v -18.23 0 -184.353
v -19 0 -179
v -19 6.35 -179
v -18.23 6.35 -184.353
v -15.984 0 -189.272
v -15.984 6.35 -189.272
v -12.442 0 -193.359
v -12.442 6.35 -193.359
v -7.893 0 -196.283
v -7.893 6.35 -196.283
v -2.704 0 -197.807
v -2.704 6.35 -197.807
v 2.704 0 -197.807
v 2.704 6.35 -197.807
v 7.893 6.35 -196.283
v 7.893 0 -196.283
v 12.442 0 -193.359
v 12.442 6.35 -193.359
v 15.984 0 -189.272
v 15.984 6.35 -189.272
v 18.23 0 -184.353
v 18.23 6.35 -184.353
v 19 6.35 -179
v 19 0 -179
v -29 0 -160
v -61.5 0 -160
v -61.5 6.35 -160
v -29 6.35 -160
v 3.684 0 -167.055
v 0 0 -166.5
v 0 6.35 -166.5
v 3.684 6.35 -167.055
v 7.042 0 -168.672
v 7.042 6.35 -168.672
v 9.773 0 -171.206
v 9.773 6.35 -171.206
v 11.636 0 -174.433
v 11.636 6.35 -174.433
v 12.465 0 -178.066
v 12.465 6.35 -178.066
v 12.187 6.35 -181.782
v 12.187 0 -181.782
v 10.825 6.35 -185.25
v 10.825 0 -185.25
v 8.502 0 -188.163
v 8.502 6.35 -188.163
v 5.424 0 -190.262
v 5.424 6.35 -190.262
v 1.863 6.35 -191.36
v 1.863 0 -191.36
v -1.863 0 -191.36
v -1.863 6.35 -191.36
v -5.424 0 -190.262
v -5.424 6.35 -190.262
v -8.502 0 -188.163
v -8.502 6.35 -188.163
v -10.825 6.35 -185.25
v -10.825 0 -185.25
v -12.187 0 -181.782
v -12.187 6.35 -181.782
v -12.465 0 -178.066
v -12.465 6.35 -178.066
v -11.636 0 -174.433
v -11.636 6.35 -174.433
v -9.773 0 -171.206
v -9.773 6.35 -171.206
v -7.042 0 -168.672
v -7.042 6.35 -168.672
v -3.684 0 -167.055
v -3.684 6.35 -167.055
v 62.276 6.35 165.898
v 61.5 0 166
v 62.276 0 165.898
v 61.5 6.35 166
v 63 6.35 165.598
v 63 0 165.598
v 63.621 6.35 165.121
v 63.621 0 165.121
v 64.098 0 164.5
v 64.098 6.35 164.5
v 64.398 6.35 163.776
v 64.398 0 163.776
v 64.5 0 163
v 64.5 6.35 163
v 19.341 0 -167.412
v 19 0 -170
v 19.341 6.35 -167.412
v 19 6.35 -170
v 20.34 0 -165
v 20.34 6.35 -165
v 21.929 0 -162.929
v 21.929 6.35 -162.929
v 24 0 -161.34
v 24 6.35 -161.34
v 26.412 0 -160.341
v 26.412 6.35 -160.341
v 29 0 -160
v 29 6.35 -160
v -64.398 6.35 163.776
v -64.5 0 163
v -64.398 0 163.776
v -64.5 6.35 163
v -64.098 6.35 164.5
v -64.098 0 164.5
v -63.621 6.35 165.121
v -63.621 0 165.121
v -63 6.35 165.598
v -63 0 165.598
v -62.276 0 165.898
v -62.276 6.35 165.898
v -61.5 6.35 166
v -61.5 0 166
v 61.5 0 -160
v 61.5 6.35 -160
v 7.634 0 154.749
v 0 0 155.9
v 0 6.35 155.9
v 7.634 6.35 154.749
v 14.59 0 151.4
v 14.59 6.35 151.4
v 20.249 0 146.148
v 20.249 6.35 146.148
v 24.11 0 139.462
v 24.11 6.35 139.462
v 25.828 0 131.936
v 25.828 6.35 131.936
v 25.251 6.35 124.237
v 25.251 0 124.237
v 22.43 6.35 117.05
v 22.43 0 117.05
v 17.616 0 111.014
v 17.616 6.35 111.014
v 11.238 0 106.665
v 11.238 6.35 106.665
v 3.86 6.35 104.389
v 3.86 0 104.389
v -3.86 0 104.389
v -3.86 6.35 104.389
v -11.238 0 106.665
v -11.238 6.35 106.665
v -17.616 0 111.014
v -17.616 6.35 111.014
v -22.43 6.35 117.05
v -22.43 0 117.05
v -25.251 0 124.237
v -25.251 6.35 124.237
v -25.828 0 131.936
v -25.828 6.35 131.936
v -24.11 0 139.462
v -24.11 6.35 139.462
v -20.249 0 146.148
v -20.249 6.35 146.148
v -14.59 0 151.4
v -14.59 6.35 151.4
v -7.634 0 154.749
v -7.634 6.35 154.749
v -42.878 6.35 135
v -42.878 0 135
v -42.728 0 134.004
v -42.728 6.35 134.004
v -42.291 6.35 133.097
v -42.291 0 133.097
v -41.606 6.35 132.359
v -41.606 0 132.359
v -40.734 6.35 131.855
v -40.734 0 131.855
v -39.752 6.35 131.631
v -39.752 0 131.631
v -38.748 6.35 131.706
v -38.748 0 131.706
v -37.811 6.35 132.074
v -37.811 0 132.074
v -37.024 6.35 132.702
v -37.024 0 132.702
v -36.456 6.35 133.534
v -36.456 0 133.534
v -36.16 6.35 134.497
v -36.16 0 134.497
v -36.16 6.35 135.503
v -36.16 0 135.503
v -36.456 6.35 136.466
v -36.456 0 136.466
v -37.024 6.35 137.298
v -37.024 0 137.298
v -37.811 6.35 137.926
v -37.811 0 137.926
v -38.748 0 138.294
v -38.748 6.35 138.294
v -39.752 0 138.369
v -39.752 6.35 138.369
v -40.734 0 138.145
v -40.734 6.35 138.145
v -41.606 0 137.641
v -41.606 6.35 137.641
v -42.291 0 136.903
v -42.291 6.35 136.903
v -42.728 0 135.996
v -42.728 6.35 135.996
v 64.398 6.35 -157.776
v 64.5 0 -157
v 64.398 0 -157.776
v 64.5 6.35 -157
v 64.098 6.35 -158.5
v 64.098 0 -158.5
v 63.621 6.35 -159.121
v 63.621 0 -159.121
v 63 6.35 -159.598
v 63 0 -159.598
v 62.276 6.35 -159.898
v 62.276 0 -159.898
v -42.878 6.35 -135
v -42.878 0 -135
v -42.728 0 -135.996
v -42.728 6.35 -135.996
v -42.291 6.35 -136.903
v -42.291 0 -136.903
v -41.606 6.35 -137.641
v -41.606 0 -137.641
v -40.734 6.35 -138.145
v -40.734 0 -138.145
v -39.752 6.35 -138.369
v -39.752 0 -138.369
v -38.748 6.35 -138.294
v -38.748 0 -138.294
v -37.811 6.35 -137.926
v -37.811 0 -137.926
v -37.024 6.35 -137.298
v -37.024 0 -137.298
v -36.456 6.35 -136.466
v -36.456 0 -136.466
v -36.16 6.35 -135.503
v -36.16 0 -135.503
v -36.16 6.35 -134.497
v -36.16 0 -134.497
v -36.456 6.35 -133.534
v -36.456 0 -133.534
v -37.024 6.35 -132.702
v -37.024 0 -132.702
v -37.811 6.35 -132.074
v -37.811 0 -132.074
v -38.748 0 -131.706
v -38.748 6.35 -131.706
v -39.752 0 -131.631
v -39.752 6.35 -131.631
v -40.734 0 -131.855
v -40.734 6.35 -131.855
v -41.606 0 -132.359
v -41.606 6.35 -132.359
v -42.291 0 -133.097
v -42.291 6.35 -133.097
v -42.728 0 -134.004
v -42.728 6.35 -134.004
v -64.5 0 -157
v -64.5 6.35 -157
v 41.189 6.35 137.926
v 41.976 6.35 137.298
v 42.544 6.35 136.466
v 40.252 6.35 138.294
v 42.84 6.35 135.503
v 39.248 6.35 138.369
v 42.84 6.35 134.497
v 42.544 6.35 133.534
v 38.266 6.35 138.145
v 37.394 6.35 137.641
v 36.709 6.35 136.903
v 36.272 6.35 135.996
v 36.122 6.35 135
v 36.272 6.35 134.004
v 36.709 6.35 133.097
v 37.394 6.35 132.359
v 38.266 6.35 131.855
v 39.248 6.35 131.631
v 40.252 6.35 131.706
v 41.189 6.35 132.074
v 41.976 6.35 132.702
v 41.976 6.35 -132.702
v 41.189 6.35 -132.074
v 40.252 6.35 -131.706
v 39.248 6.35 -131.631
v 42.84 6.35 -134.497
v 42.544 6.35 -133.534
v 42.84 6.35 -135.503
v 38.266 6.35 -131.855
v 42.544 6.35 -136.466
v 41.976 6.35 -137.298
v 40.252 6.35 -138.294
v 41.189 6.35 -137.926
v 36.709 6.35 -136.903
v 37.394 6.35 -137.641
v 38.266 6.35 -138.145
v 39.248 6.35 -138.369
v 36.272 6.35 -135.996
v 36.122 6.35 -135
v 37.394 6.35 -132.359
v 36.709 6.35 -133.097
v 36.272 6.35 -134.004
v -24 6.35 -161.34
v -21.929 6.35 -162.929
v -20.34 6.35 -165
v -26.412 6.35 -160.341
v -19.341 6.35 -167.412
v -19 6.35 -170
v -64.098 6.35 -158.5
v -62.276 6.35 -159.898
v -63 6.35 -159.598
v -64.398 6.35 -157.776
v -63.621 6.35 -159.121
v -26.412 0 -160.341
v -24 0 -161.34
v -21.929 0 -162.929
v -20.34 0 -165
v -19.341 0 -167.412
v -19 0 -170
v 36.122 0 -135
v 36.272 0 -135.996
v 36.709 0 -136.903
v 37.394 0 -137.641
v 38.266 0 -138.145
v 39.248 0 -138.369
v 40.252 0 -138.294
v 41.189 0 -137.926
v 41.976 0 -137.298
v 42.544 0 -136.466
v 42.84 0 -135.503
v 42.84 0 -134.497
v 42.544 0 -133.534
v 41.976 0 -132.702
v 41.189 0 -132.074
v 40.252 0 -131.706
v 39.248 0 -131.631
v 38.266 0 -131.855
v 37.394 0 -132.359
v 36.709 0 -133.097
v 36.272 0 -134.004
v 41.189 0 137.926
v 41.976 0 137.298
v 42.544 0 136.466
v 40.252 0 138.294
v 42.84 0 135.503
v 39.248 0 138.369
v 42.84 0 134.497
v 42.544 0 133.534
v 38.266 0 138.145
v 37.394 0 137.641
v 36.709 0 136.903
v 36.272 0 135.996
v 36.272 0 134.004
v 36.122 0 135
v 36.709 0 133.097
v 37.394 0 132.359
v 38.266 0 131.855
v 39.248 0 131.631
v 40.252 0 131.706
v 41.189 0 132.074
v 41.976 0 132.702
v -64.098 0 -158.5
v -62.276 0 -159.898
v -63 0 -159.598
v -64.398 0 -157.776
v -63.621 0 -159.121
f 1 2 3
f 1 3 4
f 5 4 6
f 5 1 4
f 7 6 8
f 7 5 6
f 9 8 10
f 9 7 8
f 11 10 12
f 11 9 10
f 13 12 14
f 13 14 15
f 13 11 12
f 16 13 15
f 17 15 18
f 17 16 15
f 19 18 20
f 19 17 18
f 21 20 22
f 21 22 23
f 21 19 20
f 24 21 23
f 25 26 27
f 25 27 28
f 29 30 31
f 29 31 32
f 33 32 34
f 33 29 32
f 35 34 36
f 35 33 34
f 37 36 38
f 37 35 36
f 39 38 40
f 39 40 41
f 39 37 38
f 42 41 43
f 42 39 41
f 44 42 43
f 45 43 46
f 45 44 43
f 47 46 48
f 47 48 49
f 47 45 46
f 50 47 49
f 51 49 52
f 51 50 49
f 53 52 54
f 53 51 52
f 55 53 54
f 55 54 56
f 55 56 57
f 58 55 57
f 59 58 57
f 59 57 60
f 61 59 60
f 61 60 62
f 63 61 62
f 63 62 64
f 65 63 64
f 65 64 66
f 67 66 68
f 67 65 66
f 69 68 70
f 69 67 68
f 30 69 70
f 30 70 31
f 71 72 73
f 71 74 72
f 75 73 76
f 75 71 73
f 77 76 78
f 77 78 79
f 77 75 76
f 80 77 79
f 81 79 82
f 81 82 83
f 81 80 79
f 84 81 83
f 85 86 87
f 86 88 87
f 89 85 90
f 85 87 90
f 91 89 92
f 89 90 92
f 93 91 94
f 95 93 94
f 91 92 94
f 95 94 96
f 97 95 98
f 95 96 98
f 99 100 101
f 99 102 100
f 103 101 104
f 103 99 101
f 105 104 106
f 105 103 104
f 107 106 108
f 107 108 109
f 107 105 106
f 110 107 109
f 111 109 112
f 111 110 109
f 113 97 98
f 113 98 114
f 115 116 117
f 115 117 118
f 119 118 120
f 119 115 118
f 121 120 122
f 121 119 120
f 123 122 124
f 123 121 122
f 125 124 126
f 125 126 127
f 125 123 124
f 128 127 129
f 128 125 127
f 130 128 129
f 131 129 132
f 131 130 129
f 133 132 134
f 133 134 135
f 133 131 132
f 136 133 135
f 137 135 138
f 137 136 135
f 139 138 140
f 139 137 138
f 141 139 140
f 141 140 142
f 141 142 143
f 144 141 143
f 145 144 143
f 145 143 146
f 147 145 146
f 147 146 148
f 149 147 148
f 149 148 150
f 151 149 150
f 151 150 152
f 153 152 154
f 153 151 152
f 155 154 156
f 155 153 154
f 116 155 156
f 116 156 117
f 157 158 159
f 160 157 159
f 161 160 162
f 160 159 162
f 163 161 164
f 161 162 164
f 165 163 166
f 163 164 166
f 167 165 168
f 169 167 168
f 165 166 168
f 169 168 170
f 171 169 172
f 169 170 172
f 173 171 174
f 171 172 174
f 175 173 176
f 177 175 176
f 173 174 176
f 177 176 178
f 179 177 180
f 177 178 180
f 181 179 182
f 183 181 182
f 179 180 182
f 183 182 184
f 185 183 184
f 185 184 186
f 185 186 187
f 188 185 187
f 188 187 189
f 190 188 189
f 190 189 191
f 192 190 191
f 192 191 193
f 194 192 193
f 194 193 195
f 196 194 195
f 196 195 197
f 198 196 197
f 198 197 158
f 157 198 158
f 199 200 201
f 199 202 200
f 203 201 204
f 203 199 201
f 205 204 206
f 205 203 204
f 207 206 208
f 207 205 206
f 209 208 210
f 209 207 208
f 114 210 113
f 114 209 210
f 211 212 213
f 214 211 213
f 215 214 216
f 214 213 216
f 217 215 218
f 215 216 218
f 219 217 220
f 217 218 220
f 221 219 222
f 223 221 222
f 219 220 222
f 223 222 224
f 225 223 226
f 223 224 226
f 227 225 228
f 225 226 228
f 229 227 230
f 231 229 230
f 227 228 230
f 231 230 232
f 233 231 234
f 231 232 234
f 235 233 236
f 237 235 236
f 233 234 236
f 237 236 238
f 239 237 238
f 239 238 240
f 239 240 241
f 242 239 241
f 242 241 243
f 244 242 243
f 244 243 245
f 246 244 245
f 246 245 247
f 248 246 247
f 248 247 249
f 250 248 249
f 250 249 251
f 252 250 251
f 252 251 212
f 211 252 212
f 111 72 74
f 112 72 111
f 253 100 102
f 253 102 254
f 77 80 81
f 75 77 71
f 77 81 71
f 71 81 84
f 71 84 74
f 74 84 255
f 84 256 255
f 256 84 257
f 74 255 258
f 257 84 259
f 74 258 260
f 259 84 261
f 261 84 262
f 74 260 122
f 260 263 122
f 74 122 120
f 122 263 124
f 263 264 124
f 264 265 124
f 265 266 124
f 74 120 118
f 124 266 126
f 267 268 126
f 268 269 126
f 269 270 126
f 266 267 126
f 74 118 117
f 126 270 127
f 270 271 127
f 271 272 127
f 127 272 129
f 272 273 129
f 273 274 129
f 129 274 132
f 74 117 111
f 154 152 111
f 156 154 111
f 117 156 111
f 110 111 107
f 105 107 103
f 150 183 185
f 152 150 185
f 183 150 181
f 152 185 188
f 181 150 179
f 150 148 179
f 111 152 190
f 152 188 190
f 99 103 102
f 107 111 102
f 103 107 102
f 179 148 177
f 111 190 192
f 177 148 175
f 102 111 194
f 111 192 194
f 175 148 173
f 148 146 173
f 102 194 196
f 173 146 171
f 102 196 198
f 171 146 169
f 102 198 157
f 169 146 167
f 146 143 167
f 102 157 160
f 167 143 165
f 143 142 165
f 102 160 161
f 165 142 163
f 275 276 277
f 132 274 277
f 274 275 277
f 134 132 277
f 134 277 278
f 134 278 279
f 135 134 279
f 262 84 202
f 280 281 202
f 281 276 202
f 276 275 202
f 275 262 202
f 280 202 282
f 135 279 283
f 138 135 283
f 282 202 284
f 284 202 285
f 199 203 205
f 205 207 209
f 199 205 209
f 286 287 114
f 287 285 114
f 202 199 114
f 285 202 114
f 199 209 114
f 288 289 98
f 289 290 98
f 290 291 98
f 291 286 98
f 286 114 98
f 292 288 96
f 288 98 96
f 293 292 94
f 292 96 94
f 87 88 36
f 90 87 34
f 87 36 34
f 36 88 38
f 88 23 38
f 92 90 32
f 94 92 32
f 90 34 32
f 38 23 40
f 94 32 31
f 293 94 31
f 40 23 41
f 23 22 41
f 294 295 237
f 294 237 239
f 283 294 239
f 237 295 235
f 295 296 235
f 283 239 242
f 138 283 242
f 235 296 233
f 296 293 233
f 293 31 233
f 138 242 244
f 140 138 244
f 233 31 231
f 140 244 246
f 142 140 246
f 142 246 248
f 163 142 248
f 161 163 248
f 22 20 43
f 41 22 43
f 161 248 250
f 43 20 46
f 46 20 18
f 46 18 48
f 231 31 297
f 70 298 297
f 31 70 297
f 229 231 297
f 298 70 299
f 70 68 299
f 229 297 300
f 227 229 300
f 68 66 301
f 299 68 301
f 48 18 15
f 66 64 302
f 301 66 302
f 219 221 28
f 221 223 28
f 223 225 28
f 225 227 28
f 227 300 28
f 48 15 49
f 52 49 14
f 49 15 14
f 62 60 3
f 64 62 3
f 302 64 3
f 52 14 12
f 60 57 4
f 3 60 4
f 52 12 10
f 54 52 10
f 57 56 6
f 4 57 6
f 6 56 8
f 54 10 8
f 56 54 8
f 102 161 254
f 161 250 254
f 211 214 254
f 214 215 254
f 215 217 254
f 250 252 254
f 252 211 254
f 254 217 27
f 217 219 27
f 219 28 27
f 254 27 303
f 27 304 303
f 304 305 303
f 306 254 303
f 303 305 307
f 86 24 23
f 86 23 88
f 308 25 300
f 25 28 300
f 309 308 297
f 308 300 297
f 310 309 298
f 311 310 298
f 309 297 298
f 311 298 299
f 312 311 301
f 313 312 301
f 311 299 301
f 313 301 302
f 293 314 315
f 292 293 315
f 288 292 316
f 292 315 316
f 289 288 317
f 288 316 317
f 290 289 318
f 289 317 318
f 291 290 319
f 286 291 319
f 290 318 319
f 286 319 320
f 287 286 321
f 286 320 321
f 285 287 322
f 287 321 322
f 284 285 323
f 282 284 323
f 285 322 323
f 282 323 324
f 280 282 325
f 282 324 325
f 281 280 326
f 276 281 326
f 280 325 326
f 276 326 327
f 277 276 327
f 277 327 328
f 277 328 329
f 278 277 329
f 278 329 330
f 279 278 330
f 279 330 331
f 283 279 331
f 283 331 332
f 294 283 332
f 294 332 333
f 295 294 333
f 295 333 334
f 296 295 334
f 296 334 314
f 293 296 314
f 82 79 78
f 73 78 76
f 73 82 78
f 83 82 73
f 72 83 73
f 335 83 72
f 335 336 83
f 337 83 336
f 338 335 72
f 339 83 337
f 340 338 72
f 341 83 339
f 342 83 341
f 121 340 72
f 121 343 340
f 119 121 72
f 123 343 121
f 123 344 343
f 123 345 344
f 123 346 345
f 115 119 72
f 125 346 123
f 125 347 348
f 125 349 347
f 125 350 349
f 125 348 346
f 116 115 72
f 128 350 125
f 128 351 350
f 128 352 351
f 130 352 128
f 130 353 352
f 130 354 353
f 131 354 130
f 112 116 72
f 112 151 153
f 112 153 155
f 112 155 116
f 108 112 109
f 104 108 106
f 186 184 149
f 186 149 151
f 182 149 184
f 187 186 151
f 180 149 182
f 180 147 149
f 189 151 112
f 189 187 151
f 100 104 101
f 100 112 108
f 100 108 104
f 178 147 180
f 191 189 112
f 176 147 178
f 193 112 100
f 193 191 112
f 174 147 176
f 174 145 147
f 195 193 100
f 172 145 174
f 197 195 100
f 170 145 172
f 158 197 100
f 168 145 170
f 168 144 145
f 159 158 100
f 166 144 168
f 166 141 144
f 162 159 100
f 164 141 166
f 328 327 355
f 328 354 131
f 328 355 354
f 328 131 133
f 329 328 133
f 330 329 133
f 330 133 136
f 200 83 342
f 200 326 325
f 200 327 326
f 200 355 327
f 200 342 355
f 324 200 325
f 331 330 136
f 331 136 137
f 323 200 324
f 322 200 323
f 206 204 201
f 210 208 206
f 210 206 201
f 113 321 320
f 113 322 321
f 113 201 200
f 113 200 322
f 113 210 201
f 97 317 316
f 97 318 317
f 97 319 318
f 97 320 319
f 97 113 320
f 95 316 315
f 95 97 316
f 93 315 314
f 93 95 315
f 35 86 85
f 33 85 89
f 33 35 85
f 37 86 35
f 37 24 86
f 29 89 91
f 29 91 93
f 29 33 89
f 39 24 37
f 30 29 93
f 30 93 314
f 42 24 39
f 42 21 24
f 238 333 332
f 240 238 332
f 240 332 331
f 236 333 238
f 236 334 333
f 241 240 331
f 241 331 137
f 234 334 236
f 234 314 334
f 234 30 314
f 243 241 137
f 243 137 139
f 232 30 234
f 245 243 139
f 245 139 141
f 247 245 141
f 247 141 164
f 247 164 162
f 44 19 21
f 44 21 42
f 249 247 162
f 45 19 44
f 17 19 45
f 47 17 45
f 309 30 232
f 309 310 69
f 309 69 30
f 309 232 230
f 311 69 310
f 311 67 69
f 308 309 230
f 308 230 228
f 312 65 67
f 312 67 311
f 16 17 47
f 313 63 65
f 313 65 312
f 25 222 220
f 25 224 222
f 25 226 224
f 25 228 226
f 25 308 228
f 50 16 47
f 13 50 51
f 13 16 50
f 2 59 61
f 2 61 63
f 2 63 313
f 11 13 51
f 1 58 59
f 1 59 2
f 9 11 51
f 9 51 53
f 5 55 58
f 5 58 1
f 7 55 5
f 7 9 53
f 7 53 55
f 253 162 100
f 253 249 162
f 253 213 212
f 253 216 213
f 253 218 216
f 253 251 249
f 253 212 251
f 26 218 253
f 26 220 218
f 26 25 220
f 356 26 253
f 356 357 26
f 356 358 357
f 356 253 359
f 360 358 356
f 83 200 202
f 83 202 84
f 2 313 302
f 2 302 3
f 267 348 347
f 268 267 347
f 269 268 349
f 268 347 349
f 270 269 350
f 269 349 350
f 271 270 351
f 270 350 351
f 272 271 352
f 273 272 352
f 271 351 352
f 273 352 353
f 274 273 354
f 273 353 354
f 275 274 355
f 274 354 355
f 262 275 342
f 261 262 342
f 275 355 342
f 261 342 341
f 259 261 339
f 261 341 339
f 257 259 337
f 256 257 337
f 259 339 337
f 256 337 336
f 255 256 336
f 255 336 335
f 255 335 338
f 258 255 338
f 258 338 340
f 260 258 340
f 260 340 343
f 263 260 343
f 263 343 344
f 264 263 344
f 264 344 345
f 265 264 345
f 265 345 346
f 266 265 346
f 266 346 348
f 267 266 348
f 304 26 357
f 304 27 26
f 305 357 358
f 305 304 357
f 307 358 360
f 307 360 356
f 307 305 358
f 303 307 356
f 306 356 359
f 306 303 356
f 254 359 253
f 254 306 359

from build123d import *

# Parameters (mm, degrees)
SKETCH1_R                   = 25.9
SKETCH1_R_2                 = 12.5
BOSS_EXTRUDE1_DEPTH         = 6.35
F_1_4_CLEARANCE_HOLE1_D     = 6.7564
F_1_4_CLEARANCE_HOLE1_DEPTH = 19.53
F_1_4_CLEARANCE_HOLE1_TIP   = 2.029827343
FILLET1_R                   = 10
FILLET2_R                   = 3


with BuildPart() as part:
    # Sketch1 → Boss-Extrude1 (new body)
    with BuildSketch(Plane(origin=(0, 0, 0), x_dir=(1, 0, 0), z_dir=(0, 1, 0))):
        with BuildLine():
            Line((-64.5, 160), (-19, 160))
            Line((-19, 160), (-19, 179))
            ThreePointArc((-19, 179), (0, 198), (19, 179))
            Line((19, 179), (19, 160))
            Line((19, 160), (64.5, 160))
            Line((64.5, 160), (64.5, -166))
            Line((64.5, -166), (-64.5, -166))
            Line((-64.5, -166), (-64.5, 160))
        make_face()
        with Locations(Location((0, -130, 0), (0, 0, 270))):  # turned: the seam where the file's is
            Circle(SKETCH1_R, mode=Mode.SUBTRACT)
        with Locations(Location((0, 179, 0), (0, 0, 270))):  # turned: the seam where the file's is
            Circle(SKETCH1_R_2, mode=Mode.SUBTRACT)
    extrude(amount=BOSS_EXTRUDE1_DEPTH)

    # 1/4 Clearance Hole1
    with Locations(Plane(origin=(0, 6.35, 0), x_dir=(1, 0, 0), z_dir=(0, 1, 0))):
        with Locations((-39.5, 135), (39.5, 135), (39.5, -135), (-39.5, -135)):
            Hole(F_1_4_CLEARANCE_HOLE1_D / 2, depth=F_1_4_CLEARANCE_HOLE1_DEPTH)
            with Locations((0, 0, -(F_1_4_CLEARANCE_HOLE1_DEPTH + F_1_4_CLEARANCE_HOLE1_TIP / 2))):  # 118° drill point
                Cone(0, F_1_4_CLEARANCE_HOLE1_D / 2, F_1_4_CLEARANCE_HOLE1_TIP, mode=Mode.SUBTRACT)

    # Fillet1
    fillet1_edges = [part.edges().sort_by_distance(p)[0] for p in [
        (-19, 3.175, -160),
        (19, 3.175, -160),
    ]]
    fillet(fillet1_edges, radius=FILLET1_R)

    # Fillet2
    fillet2_edges = [part.edges().sort_by_distance(p)[0] for p in [
        (64.5, 3.175, 166),
        (-64.5, 3.175, 166),
        (-64.5, 3.175, -160),
        (64.5, 3.175, -160),
    ]]
    fillet(fillet2_edges, radius=FILLET2_R)


solid = part.part
